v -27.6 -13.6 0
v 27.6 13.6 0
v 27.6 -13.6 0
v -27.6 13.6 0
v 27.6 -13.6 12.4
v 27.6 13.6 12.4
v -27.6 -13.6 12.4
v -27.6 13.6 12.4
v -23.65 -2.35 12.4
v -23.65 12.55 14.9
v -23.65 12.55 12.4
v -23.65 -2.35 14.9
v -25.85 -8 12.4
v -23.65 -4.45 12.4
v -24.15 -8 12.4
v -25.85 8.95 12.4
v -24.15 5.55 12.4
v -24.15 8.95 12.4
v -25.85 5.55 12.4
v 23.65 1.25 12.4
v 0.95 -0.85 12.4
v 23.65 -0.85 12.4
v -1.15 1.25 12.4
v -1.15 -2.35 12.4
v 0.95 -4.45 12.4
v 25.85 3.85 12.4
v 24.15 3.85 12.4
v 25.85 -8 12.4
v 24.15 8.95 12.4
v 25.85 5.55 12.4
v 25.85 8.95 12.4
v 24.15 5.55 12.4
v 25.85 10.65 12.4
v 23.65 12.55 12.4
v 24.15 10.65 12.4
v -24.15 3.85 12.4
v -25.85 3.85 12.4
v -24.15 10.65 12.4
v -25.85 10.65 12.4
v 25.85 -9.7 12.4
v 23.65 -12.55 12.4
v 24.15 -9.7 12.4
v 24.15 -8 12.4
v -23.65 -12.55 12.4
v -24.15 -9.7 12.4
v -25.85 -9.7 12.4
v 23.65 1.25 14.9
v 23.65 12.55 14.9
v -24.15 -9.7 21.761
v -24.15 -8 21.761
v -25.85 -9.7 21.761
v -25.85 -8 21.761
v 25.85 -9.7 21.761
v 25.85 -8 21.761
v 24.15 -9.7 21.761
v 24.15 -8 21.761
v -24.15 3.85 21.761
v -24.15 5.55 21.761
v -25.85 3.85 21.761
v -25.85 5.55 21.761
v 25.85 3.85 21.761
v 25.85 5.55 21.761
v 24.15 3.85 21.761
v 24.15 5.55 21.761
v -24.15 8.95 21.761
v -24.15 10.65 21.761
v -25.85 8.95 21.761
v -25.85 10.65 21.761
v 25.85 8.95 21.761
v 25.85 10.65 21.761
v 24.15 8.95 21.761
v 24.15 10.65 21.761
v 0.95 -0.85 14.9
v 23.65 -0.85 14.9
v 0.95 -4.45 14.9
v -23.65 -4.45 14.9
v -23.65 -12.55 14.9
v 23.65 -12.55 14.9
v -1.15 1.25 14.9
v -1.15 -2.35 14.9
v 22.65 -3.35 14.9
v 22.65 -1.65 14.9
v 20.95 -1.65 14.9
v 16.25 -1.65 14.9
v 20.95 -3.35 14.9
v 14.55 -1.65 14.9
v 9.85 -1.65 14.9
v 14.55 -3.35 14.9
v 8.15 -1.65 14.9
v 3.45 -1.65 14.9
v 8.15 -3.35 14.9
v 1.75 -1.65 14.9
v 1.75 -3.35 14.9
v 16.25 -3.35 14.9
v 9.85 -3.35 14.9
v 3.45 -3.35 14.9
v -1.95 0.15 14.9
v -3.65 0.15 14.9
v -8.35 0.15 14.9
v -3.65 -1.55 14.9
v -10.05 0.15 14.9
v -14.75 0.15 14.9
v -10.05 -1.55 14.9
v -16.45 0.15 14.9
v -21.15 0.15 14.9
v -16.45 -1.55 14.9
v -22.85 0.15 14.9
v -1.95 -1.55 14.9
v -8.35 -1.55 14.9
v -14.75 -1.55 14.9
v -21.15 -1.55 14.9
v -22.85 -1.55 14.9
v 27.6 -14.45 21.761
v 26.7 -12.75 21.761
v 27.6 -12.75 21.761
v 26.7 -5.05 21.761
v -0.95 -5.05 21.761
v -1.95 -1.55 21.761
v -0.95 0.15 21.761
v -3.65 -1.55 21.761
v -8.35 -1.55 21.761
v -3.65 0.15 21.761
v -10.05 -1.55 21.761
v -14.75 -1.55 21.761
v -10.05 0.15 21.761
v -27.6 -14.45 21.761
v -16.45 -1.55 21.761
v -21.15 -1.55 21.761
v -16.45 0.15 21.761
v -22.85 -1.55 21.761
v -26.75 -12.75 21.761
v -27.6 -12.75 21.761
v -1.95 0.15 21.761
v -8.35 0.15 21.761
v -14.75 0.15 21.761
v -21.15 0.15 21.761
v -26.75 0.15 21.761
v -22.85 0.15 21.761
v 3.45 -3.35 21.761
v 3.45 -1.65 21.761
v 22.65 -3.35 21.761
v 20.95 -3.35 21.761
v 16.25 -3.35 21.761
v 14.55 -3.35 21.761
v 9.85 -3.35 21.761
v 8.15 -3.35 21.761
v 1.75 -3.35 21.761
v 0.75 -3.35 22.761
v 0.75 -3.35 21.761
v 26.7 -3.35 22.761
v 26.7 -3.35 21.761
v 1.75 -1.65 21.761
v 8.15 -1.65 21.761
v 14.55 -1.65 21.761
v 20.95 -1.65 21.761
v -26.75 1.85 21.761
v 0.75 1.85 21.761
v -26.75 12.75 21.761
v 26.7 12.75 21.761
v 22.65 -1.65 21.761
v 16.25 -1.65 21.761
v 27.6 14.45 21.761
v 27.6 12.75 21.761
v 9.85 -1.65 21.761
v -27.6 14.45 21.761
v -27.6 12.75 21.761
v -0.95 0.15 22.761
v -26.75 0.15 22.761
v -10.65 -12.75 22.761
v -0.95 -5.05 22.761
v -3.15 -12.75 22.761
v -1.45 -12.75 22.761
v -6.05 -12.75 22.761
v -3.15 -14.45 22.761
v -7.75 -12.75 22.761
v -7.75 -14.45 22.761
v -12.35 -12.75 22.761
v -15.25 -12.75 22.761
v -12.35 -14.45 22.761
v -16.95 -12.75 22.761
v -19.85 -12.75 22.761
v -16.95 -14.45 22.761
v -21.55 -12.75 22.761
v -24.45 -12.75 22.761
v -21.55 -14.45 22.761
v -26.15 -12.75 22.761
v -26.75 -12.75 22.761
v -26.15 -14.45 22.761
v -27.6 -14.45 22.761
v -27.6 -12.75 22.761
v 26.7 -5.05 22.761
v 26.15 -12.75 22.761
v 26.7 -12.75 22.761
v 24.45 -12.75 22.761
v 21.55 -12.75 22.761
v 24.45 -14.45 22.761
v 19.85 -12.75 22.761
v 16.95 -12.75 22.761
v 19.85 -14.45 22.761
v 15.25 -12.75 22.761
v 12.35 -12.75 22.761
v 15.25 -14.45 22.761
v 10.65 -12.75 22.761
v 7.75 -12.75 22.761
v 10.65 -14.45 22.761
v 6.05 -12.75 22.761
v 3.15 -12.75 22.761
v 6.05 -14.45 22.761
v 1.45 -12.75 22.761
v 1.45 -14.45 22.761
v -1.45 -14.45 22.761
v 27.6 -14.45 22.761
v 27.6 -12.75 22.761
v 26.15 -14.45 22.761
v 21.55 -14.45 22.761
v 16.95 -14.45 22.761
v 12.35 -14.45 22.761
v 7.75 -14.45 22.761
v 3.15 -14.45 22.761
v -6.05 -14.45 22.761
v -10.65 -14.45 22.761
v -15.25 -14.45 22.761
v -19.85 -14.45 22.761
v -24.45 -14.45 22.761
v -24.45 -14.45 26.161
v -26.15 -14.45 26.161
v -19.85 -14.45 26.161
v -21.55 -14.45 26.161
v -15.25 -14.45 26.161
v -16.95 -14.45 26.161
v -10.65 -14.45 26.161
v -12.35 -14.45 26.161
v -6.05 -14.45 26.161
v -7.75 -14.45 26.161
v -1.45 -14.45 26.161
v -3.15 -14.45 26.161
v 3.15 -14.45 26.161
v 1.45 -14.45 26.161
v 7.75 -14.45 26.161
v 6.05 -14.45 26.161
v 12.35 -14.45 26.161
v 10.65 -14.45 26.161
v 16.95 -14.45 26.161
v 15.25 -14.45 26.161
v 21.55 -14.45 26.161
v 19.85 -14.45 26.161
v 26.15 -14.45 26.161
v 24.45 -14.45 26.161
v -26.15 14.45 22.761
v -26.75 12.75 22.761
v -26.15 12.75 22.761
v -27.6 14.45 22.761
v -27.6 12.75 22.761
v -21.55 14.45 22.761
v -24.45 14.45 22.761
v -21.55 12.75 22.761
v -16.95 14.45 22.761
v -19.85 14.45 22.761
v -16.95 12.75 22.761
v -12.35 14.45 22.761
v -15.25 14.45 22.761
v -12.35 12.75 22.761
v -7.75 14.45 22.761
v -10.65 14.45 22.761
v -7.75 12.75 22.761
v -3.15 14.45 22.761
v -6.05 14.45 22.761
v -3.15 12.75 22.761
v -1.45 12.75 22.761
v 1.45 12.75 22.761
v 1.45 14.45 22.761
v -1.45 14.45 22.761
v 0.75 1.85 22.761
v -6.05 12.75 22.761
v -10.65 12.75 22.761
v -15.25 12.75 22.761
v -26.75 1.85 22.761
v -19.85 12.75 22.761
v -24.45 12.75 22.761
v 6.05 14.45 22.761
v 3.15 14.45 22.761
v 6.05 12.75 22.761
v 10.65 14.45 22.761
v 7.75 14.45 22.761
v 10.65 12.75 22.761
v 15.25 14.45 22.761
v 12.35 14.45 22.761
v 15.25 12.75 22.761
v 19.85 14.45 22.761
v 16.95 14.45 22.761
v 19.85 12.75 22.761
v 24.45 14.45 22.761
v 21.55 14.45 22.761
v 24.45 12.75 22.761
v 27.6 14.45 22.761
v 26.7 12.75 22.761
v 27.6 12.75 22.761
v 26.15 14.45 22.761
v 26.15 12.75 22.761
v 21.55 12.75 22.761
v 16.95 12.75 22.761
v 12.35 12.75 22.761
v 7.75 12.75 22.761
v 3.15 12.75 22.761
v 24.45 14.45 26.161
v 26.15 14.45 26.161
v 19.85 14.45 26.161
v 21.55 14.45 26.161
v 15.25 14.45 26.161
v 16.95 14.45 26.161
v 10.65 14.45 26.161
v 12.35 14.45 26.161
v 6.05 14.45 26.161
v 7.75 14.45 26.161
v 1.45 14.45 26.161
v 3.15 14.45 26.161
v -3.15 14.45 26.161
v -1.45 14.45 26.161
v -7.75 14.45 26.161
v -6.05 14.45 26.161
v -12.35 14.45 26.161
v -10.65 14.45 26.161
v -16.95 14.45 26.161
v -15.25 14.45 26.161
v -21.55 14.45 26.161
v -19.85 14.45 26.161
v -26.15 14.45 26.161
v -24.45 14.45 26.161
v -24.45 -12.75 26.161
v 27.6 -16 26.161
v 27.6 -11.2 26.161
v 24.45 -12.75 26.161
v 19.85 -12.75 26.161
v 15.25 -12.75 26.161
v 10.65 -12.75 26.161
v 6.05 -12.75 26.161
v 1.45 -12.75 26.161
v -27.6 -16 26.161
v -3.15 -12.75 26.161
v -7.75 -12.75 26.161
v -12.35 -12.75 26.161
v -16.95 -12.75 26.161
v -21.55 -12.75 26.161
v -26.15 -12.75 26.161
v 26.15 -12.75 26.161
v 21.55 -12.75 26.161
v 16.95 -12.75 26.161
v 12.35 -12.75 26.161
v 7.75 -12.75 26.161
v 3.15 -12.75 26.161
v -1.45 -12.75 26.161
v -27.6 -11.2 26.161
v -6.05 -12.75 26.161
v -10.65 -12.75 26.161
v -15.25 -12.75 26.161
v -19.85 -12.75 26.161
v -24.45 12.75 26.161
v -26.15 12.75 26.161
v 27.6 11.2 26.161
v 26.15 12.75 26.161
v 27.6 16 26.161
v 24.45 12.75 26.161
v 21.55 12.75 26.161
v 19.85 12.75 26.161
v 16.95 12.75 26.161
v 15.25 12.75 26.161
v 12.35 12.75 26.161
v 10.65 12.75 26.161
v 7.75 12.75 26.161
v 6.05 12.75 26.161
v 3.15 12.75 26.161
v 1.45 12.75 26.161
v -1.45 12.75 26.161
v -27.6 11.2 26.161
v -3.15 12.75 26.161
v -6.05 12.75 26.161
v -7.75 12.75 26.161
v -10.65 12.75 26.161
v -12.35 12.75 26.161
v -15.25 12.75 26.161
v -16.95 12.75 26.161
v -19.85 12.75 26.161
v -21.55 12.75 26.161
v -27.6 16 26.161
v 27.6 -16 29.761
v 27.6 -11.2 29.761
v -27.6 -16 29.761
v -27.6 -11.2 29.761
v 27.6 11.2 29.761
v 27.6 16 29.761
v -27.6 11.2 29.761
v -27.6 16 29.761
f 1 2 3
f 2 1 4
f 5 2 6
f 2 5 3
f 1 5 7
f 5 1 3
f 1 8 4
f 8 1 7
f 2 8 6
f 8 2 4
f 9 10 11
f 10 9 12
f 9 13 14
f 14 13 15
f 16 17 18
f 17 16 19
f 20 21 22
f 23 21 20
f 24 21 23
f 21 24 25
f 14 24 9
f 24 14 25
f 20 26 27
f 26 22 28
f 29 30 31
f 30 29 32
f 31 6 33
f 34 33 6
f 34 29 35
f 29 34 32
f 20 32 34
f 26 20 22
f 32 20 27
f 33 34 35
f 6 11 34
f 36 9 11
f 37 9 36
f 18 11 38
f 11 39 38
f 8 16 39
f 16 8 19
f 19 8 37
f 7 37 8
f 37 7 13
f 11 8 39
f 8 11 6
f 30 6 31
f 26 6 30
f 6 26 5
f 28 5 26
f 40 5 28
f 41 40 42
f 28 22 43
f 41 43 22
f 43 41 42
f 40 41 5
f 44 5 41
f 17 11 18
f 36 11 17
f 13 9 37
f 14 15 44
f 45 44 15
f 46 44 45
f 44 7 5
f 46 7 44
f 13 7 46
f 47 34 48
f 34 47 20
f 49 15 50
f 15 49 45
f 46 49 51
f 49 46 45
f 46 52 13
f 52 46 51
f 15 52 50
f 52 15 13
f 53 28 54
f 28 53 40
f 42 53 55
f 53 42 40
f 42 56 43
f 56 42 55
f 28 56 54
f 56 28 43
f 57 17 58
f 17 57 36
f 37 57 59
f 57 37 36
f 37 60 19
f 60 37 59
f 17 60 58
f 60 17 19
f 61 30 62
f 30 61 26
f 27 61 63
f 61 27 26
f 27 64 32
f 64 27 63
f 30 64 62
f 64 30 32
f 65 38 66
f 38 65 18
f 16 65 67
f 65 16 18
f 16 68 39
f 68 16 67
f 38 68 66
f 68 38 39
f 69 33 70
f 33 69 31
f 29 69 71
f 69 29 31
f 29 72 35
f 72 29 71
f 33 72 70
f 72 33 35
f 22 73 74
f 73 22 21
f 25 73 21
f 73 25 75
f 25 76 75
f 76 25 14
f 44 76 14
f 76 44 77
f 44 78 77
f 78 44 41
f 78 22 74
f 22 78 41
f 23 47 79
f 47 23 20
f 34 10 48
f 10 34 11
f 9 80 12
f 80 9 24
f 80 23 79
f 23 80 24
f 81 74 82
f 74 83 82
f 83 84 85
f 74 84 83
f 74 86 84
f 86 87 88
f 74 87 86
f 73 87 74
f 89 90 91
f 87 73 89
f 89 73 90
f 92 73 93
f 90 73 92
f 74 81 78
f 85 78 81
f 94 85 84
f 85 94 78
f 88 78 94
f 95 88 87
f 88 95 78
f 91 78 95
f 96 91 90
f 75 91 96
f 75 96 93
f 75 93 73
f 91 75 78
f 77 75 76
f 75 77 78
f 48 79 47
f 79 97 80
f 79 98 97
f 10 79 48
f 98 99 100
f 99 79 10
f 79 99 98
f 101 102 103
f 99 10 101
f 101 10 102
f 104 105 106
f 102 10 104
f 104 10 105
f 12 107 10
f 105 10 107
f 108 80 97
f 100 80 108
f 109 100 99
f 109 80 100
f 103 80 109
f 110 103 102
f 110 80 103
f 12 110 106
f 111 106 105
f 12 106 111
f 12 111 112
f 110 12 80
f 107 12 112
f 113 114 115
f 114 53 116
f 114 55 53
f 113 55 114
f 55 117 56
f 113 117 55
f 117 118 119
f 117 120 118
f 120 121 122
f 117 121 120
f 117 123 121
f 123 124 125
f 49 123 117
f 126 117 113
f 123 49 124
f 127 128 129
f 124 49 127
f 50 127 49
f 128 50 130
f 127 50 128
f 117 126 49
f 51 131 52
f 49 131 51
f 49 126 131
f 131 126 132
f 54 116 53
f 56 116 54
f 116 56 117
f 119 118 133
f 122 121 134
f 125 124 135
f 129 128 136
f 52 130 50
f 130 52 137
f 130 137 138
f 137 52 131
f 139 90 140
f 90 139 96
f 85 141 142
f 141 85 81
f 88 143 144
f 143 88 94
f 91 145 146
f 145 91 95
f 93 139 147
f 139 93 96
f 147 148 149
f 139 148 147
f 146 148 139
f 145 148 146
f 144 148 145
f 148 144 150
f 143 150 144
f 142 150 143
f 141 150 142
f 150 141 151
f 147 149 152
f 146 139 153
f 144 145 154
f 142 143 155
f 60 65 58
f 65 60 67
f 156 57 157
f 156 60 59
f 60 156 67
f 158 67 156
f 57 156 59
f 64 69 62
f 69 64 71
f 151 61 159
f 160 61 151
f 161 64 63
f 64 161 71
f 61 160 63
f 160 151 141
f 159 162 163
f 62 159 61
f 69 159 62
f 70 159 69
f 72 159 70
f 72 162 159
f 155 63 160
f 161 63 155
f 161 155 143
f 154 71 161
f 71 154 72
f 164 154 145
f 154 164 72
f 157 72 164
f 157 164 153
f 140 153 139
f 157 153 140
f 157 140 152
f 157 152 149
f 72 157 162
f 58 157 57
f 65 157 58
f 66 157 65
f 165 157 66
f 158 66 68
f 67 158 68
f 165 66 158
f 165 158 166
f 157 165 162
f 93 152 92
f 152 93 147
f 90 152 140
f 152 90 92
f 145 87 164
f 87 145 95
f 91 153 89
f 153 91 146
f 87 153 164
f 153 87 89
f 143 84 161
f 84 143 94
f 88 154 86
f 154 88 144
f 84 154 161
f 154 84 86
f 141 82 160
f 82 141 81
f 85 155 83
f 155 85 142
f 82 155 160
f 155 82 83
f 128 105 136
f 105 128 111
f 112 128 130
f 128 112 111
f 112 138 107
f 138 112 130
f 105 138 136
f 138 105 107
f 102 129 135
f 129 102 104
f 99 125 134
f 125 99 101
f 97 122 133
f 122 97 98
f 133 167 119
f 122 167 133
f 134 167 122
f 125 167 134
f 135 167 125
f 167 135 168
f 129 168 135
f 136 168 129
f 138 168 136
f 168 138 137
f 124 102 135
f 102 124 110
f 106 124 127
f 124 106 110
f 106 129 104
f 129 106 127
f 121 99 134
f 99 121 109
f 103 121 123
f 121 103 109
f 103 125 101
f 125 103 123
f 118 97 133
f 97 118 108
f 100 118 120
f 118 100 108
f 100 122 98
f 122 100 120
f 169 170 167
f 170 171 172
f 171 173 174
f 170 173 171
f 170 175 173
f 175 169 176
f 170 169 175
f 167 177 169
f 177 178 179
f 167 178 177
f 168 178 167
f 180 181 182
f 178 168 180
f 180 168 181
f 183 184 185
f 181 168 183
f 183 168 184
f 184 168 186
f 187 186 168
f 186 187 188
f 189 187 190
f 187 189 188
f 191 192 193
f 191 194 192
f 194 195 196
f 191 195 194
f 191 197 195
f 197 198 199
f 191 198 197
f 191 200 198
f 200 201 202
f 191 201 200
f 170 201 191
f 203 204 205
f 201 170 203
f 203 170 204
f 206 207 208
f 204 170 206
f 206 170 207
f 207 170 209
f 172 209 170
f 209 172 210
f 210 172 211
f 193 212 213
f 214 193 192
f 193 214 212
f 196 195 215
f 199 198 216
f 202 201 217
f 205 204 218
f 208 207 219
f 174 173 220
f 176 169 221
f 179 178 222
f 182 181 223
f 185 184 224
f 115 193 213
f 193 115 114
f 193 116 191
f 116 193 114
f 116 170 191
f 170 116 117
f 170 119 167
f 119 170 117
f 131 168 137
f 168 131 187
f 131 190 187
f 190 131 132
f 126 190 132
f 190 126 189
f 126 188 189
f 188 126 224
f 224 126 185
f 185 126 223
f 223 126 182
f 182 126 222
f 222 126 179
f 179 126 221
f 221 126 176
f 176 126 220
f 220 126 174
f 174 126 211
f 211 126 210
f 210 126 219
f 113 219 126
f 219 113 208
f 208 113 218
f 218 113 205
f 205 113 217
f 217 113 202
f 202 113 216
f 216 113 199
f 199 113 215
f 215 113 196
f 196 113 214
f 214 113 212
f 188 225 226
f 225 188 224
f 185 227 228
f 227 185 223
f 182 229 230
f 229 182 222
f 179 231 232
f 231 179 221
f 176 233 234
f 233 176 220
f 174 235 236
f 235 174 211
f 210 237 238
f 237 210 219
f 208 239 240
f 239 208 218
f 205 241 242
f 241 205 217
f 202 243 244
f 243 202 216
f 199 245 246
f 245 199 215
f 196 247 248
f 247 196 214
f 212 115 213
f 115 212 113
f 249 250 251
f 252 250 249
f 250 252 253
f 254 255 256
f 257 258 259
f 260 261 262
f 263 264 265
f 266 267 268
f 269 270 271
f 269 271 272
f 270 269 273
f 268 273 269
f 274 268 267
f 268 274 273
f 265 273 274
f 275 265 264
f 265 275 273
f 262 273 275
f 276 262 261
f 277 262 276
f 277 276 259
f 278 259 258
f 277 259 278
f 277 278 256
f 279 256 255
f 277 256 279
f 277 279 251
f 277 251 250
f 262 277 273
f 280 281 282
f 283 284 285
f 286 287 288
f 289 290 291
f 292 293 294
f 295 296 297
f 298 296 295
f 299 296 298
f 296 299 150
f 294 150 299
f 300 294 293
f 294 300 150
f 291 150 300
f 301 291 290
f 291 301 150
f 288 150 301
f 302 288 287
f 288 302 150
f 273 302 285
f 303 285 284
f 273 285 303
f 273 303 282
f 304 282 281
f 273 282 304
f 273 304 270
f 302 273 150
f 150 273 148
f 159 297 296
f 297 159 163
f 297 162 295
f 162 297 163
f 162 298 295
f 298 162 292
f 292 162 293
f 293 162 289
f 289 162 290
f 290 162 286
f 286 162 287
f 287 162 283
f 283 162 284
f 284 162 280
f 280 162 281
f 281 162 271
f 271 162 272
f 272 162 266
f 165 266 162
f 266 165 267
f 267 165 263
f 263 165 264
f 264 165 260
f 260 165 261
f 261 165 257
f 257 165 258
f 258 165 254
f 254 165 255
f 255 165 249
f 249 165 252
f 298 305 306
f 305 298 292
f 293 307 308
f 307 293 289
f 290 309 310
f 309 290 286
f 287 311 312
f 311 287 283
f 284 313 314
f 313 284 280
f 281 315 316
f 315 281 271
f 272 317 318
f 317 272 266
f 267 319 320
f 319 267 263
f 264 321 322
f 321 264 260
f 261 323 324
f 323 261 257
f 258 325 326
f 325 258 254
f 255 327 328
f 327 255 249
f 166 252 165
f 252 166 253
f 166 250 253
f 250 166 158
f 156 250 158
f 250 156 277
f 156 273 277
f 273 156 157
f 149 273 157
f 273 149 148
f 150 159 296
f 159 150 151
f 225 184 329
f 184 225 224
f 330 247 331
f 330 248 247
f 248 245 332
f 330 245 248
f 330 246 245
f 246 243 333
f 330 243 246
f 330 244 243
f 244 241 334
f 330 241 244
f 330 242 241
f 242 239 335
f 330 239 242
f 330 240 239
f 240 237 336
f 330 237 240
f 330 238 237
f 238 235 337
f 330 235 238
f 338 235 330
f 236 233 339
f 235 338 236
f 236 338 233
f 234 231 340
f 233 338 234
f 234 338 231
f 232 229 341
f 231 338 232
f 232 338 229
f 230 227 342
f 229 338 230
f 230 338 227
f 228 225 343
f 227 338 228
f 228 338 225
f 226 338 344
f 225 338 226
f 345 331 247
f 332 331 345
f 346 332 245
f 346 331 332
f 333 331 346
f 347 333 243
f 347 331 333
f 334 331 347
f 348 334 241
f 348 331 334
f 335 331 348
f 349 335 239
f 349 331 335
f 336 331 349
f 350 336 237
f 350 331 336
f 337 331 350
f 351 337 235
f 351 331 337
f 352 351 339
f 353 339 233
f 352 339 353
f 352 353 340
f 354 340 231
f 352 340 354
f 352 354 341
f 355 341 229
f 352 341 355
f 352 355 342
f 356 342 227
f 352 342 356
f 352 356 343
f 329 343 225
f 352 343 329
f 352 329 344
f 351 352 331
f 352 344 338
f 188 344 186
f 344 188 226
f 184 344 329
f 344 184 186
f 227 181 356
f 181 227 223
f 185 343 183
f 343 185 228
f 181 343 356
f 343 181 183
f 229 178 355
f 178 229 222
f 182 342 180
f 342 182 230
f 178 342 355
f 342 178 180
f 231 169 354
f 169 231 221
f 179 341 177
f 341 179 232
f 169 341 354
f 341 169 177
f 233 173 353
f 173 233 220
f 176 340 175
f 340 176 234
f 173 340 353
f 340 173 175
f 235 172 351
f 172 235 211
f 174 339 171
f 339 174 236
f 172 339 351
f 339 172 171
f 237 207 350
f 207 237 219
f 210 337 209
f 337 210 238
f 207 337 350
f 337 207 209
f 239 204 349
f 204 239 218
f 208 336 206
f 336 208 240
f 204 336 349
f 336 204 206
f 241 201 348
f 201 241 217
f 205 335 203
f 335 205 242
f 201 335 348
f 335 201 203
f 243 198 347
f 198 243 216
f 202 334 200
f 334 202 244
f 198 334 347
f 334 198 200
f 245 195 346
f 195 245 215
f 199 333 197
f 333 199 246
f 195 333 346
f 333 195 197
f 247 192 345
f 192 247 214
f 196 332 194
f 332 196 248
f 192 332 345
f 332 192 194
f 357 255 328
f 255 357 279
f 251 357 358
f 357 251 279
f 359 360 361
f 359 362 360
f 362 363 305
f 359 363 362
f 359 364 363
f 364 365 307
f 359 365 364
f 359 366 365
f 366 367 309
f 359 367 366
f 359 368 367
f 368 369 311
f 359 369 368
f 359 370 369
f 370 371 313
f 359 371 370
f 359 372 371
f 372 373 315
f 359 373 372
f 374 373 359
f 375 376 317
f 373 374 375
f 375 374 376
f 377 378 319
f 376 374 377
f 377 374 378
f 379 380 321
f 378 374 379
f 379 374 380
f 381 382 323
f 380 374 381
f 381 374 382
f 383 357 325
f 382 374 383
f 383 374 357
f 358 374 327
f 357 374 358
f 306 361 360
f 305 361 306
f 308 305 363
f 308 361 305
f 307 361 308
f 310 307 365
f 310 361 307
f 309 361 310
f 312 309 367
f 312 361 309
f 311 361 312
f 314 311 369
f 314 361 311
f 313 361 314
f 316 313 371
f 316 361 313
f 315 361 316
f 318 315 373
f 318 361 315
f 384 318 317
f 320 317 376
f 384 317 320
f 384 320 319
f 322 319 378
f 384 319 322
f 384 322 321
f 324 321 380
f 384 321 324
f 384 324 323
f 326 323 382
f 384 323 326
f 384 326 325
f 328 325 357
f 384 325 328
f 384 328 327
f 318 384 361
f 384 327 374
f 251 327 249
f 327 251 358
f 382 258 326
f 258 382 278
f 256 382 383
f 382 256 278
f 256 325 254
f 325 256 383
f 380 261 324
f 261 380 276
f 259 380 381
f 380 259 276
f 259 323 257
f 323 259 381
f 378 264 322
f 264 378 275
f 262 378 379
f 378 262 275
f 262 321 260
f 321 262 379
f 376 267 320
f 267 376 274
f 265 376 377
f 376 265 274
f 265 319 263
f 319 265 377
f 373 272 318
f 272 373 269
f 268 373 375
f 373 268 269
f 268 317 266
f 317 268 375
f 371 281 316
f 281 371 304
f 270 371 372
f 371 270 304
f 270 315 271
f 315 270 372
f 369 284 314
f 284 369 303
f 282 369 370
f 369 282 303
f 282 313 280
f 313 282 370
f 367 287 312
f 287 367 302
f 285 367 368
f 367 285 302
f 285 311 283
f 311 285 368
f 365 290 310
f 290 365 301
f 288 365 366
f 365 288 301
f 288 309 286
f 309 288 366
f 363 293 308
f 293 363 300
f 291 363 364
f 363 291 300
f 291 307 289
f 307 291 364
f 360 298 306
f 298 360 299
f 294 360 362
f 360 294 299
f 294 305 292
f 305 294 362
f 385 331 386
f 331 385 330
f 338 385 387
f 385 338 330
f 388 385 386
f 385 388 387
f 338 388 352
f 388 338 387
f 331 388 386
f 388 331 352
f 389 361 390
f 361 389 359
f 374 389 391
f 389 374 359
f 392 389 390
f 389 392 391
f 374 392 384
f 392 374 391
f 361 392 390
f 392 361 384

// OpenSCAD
// Generated by SolidPython 0.4.2 on 2020-09-29 23:20:25
//!OpenSCAD

scale(v = 0.0100000000) {
	translate(v = [-2760, -1360, 0]) {
		union() {
			color(c = [0.4000000000, 0.4000000000, 0.4000000000]) {
				translate(v = [0, 0, 0]) {
					linear_extrude(height = 1000.0000000000) {
						polygon(paths = [[0, 1, 2, 3]], points = [[0, 0], [0, 2720], [5520, 2720], [5520, 0]]);
					}
				}
			}
			color(c = [0.2000000000, 0.6000000000, 0.2000000000]) {
				translate(v = [0, 0, 1000.0000000000]) {
					linear_extrude(height = 120.0000000000) {
						polygon(paths = [[0, 1, 2, 3]], points = [[0, 1305], [0, 2720], [5520, 2720], [5520, 1305]]);
					}
				}
			}
			color(c = [0.4000000000, 0.4000000000, 0.4000000000]) {
				translate(v = [0, 0, 1000.0000000000]) {
					linear_extrude(height = 120.0000000000) {
						polygon(paths = [[0, 1, 2, 3]], points = [[0, 0], [0, 1305], [5520, 1305], [5520, 0]]);
					}
				}
			}
			color(c = [0.9000000000, 0.6000000000, 0.6000000000]) {
				translate(v = [0, 0, 1120.0000000000]) {
					linear_extrude(height = 120.0000000000) {
						polygon(paths = [[0, 1, 2, 3]], points = [[135, 1615], [135, 2485], [395, 2485], [395, 1615]]);
					}
				}
			}
			color(c = [0.9000000000, 0.6000000000, 0.6000000000]) {
				translate(v = [0, 0, 1120.0000000000]) {
					linear_extrude(height = 120.0000000000) {
						polygon(paths = [[0, 1, 2, 3]], points = [[5125, 1615], [5125, 2485], [5385, 2485], [5385, 1615]]);
					}
				}
			}
			color(c = [0.9000000000, 0.6000000000, 0.9000000000]) {
				translate(v = [0, 0, 1120.0000000000]) {
					linear_extrude(height = 120.0000000000) {
						polygon(paths = [[0, 1, 2, 3]], points = [[135, 235], [135, 785], [395, 785], [395, 235]]);
					}
				}
			}
			color(c = [0.9000000000, 0.6000000000, 0.9000000000]) {
				translate(v = [0, 0, 1120.0000000000]) {
					linear_extrude(height = 120.0000000000) {
						polygon(paths = [[0, 1, 2, 3]], points = [[5125, 235], [5125, 785], [5385, 785], [5385, 235]]);
					}
				}
			}
			color(c = [0.2000000000, 0.6000000000, 0.2000000000]) {
				translate(v = [0, 0, 1120.0000000000]) {
					linear_extrude(height = 120.0000000000) {
						difference() {
							polygon(paths = [[0, 1, 2, 3]], points = [[0, 1305], [0, 2720], [5520, 2720], [5520, 1305]]);
							polygon(paths = [[0, 1, 2, 3]], points = [[135, 1615], [395, 1615], [395, 2485], [135, 2485]]);
							polygon(paths = [[0, 1, 2, 3]], points = [[5125, 1615], [5385, 1615], [5385, 2485], [5125, 2485]]);
						}
					}
				}
			}
			color(c = [0.4000000000, 0.4000000000, 0.4000000000]) {
				translate(v = [0, 0, 1120.0000000000]) {
					linear_extrude(height = 120.0000000000) {
						difference() {
							polygon(paths = [[0, 1, 2, 3]], points = [[0, 0], [0, 1305], [5520, 1305], [5520, 0]]);
							polygon(paths = [[0, 1, 2, 3]], points = [[135, 235], [395, 235], [395, 785], [135, 785]]);
							polygon(paths = [[0, 1, 2, 3]], points = [[5125, 235], [5385, 235], [5385, 785], [5125, 785]]);
						}
					}
				}
			}
			color(c = [0.1000000000, 0.1000000000, 0.1000000000]) {
				translate(v = [0, 0, 1240.0000000000]) {
					linear_extrude(height = 70.0000000000) {
						polygon(paths = [[0, 1, 2, 3]], points = [[175, 390], [175, 560], [345, 560], [345, 390]]);
					}
				}
			}
			color(c = [0.1000000000, 0.1000000000, 0.1000000000]) {
				translate(v = [0, 0, 1240.0000000000]) {
					linear_extrude(height = 70.0000000000) {
						polygon(paths = [[0, 1, 2, 3]], points = [[5175, 390], [5175, 560], [5345, 560], [5345, 390]]);
					}
				}
			}
			color(c = [0.1000000000, 0.1000000000, 0.1000000000]) {
				translate(v = [0, 0, 1240.0000000000]) {
					linear_extrude(height = 70.0000000000) {
						polygon(paths = [[0, 1, 2, 3]], points = [[175, 1745], [175, 1915], [345, 1915], [345, 1745]]);
					}
				}
			}
			color(c = [0.1000000000, 0.1000000000, 0.1000000000]) {
				translate(v = [0, 0, 1240.0000000000]) {
					linear_extrude(height = 70.0000000000) {
						polygon(paths = [[0, 1, 2, 3]], points = [[5175, 1745], [5175, 1915], [5345, 1915], [5345, 1745]]);
					}
				}
			}
			color(c = [0.1000000000, 0.1000000000, 0.1000000000]) {
				translate(v = [0, 0, 1240.0000000000]) {
					linear_extrude(height = 70.0000000000) {
						polygon(paths = [[0, 1, 2, 3]], points = [[175, 2255], [175, 2425], [345, 2425], [345, 2255]]);
					}
				}
			}
			color(c = [0.1000000000, 0.1000000000, 0.1000000000]) {
				translate(v = [0, 0, 1240.0000000000]) {
					linear_extrude(height = 70.0000000000) {
						polygon(paths = [[0, 1, 2, 3]], points = [[5175, 2255], [5175, 2425], [5345, 2425], [5345, 2255]]);
					}
				}
			}
			color(c = [1.0000000000, 1.0000000000, 1.0000000000]) {
				translate(v = [0, 0, 1240.0000000000]) {
					linear_extrude(height = 70.0000000000) {
						polygon(paths = [[0, 1, 2, 3, 4, 5]], points = [[395, 105], [395, 915], [2855, 915], [2855, 1275], [5125, 1275], [5125, 105]]);
					}
				}
			}
			color(c = [1.0000000000, 1.0000000000, 1.0000000000]) {
				translate(v = [0, 0, 1240.0000000000]) {
					linear_extrude(height = 70.0000000000) {
						polygon(paths = [[0, 1, 2, 3, 4, 5]], points = [[395, 1125], [395, 2615], [5125, 2615], [5125, 1485], [2645, 1485], [2645, 1125]]);
					}
				}
			}
			color(c = [0.1000000000, 0.1000000000, 0.1000000000]) {
				translate(v = [0, 0, 1310.0000000000]) {
					linear_extrude(height = 180.0000000000) {
						polygon(paths = [[0, 1, 2, 3]], points = [[175, 390], [175, 560], [345, 560], [345, 390]]);
					}
				}
			}
			color(c = [0.1000000000, 0.1000000000, 0.1000000000]) {
				translate(v = [0, 0, 1310.0000000000]) {
					linear_extrude(height = 180.0000000000) {
						polygon(paths = [[0, 1, 2, 3]], points = [[5175, 390], [5175, 560], [5345, 560], [5345, 390]]);
					}
				}
			}
			color(c = [0.1000000000, 0.1000000000, 0.1000000000]) {
				translate(v = [0, 0, 1310.0000000000]) {
					linear_extrude(height = 180.0000000000) {
						polygon(paths = [[0, 1, 2, 3]], points = [[175, 1745], [175, 1915], [345, 1915], [345, 1745]]);
					}
				}
			}
			color(c = [0.1000000000, 0.1000000000, 0.1000000000]) {
				translate(v = [0, 0, 1310.0000000000]) {
					linear_extrude(height = 180.0000000000) {
						polygon(paths = [[0, 1, 2, 3]], points = [[5175, 1745], [5175, 1915], [5345, 1915], [5345, 1745]]);
					}
				}
			}
			color(c = [0.1000000000, 0.1000000000, 0.1000000000]) {
				translate(v = [0, 0, 1310.0000000000]) {
					linear_extrude(height = 180.0000000000) {
						polygon(paths = [[0, 1, 2, 3]], points = [[175, 2255], [175, 2425], [345, 2425], [345, 2255]]);
					}
				}
			}
			color(c = [0.1000000000, 0.1000000000, 0.1000000000]) {
				translate(v = [0, 0, 1310.0000000000]) {
					linear_extrude(height = 180.0000000000) {
						polygon(paths = [[0, 1, 2, 3]], points = [[5175, 2255], [5175, 2425], [5345, 2425], [5345, 2255]]);
					}
				}
			}
			color(c = [0.7000000000, 0, 0]) {
				translate(v = [0, 0, 1310.0000000000]) {
					linear_extrude(height = 180.0000000000) {
						polygon(paths = [[0, 1, 2, 3, 4, 5]], points = [[395, 105], [395, 915], [2855, 915], [2855, 1275], [5125, 1275], [5125, 105]]);
					}
				}
			}
			color(c = [0.7000000000, 0, 0]) {
				translate(v = [0, 0, 1310.0000000000]) {
					linear_extrude(height = 180.0000000000) {
						polygon(paths = [[0, 1, 2, 3, 4, 5]], points = [[395, 1125], [395, 2615], [5125, 2615], [5125, 1485], [2645, 1485], [2645, 1125]]);
					}
				}
			}
			color(c = [0.1000000000, 0.1000000000, 0.1000000000]) {
				translate(v = [0, 0, 1490.0000000000]) {
					linear_extrude(height = 686.1000000000) {
						polygon(paths = [[0, 1, 2, 3]], points = [[175, 390], [175, 560], [345, 560], [345, 390]]);
					}
				}
			}
			color(c = [0.1000000000, 0.1000000000, 0.1000000000]) {
				translate(v = [0, 0, 1490.0000000000]) {
					linear_extrude(height = 686.1000000000) {
						polygon(paths = [[0, 1, 2, 3]], points = [[5175, 390], [5175, 560], [5345, 560], [5345, 390]]);
					}
				}
			}
			color(c = [0.1000000000, 0.1000000000, 0.1000000000]) {
				translate(v = [0, 0, 1490.0000000000]) {
					linear_extrude(height = 686.1000000000) {
						polygon(paths = [[0, 1, 2, 3]], points = [[2935, 1025], [2935, 1195], [3105, 1195], [3105, 1025]]);
					}
				}
			}
			color(c = [0.1000000000, 0.1000000000, 0.1000000000]) {
				translate(v = [0, 0, 1490.0000000000]) {
					linear_extrude(height = 686.1000000000) {
						polygon(paths = [[0, 1, 2, 3]], points = [[3575, 1025], [3575, 1195], [3745, 1195], [3745, 1025]]);
					}
				}
			}
			color(c = [0.1000000000, 0.1000000000, 0.1000000000]) {
				translate(v = [0, 0, 1490.0000000000]) {
					linear_extrude(height = 686.1000000000) {
						polygon(paths = [[0, 1, 2, 3]], points = [[4215, 1025], [4215, 1195], [4385, 1195], [4385, 1025]]);
					}
				}
			}
			color(c = [0.1000000000, 0.1000000000, 0.1000000000]) {
				translate(v = [0, 0, 1490.0000000000]) {
					linear_extrude(height = 686.1000000000) {
						polygon(paths = [[0, 1, 2, 3]], points = [[4855, 1025], [4855, 1195], [5025, 1195], [5025, 1025]]);
					}
				}
			}
			color(c = [0.1000000000, 0.1000000000, 0.1000000000]) {
				translate(v = [0, 0, 1490.0000000000]) {
					linear_extrude(height = 686.1000000000) {
						polygon(paths = [[0, 1, 2, 3]], points = [[475, 1205], [475, 1375], [645, 1375], [645, 1205]]);
					}
				}
			}
			color(c = [0.1000000000, 0.1000000000, 0.1000000000]) {
				translate(v = [0, 0, 1490.0000000000]) {
					linear_extrude(height = 686.1000000000) {
						polygon(paths = [[0, 1, 2, 3]], points = [[1115, 1205], [1115, 1375], [1285, 1375], [1285, 1205]]);
					}
				}
			}
			color(c = [0.1000000000, 0.1000000000, 0.1000000000]) {
				translate(v = [0, 0, 1490.0000000000]) {
					linear_extrude(height = 686.1000000000) {
						polygon(paths = [[0, 1, 2, 3]], points = [[1755, 1205], [1755, 1375], [1925, 1375], [1925, 1205]]);
					}
				}
			}
			color(c = [0.1000000000, 0.1000000000, 0.1000000000]) {
				translate(v = [0, 0, 1490.0000000000]) {
					linear_extrude(height = 686.1000000000) {
						polygon(paths = [[0, 1, 2, 3]], points = [[2395, 1205], [2395, 1375], [2565, 1375], [2565, 1205]]);
					}
				}
			}
			color(c = [0.1000000000, 0.1000000000, 0.1000000000]) {
				translate(v = [0, 0, 1490.0000000000]) {
					linear_extrude(height = 686.1000000000) {
						polygon(paths = [[0, 1, 2, 3]], points = [[175, 1745], [175, 1915], [345, 1915], [345, 1745]]);
					}
				}
			}
			color(c = [0.1000000000, 0.1000000000, 0.1000000000]) {
				translate(v = [0, 0, 1490.0000000000]) {
					linear_extrude(height = 686.1000000000) {
						polygon(paths = [[0, 1, 2, 3]], points = [[5175, 1745], [5175, 1915], [5345, 1915], [5345, 1745]]);
					}
				}
			}
			color(c = [0.1000000000, 0.1000000000, 0.1000000000]) {
				translate(v = [0, 0, 1490.0000000000]) {
					linear_extrude(height = 686.1000000000) {
						polygon(paths = [[0, 1, 2, 3]], points = [[175, 2255], [175, 2425], [345, 2425], [345, 2255]]);
					}
				}
			}
			color(c = [0.1000000000, 0.1000000000, 0.1000000000]) {
				translate(v = [0, 0, 1490.0000000000]) {
					linear_extrude(height = 686.1000000000) {
						polygon(paths = [[0, 1, 2, 3]], points = [[5175, 2255], [5175, 2425], [5345, 2425], [5345, 2255]]);
					}
				}
			}
			color(c = [0.9000000000, 0.6000000000, 0.6000000000]) {
				translate(v = [0, 0, 2176.1000000000]) {
					linear_extrude(height = 100.0000000000) {
						polygon(paths = [[0, 1, 2, 3, 4, 5, 6, 7, 8, 9]], points = [[0, -85], [0, 85], [85, 85], [85, 1375], [2665, 1375], [2665, 855], [5430, 855], [5430, 85], [5520, 85], [5520, -85]]);
					}
				}
			}
			color(c = [0.9000000000, 0.6000000000, 0.6000000000]) {
				translate(v = [0, 0, 2176.1000000000]) {
					linear_extrude(height = 100.0000000000) {
						polygon(paths = [[0, 1, 2, 3, 4, 5, 6, 7, 8, 9]], points = [[2835, 1025], [2835, 1545], [85, 1545], [85, 2635], [0, 2635], [0, 2805], [5520, 2805], [5520, 2635], [5430, 2635], [5430, 1025]]);
					}
				}
			}
			color(c = [0.5000000000, 0.5000000000, 0.5000000000]) {
				translate(v = [0, 0, 2276.1000000000]) {
					linear_extrude(height = 340.0000000000) {
						polygon(paths = [[0, 1, 2, 3]], points = [[145, -85], [145, 85], [315, 85], [315, -85]]);
					}
				}
			}
			color(c = [0.5000000000, 0.5000000000, 0.5000000000]) {
				translate(v = [0, 0, 2276.1000000000]) {
					linear_extrude(height = 340.0000000000) {
						polygon(paths = [[0, 1, 2, 3]], points = [[605, -85], [605, 85], [775, 85], [775, -85]]);
					}
				}
			}
			color(c = [0.5000000000, 0.5000000000, 0.5000000000]) {
				translate(v = [0, 0, 2276.1000000000]) {
					linear_extrude(height = 340.0000000000) {
						polygon(paths = [[0, 1, 2, 3]], points = [[1065, -85], [1065, 85], [1235, 85], [1235, -85]]);
					}
				}
			}
			color(c = [0.5000000000, 0.5000000000, 0.5000000000]) {
				translate(v = [0, 0, 2276.1000000000]) {
					linear_extrude(height = 340.0000000000) {
						polygon(paths = [[0, 1, 2, 3]], points = [[1525, -85], [1525, 85], [1695, 85], [1695, -85]]);
					}
				}
			}
			color(c = [0.5000000000, 0.5000000000, 0.5000000000]) {
				translate(v = [0, 0, 2276.1000000000]) {
					linear_extrude(height = 340.0000000000) {
						polygon(paths = [[0, 1, 2, 3]], points = [[1985, -85], [1985, 85], [2155, 85], [2155, -85]]);
					}
				}
			}
			color(c = [0.5000000000, 0.5000000000, 0.5000000000]) {
				translate(v = [0, 0, 2276.1000000000]) {
					linear_extrude(height = 340.0000000000) {
						polygon(paths = [[0, 1, 2, 3]], points = [[2445, -85], [2445, 85], [2615, 85], [2615, -85]]);
					}
				}
			}
			color(c = [0.5000000000, 0.5000000000, 0.5000000000]) {
				translate(v = [0, 0, 2276.1000000000]) {
					linear_extrude(height = 340.0000000000) {
						polygon(paths = [[0, 1, 2, 3]], points = [[2905, -85], [2905, 85], [3075, 85], [3075, -85]]);
					}
				}
			}
			color(c = [0.5000000000, 0.5000000000, 0.5000000000]) {
				translate(v = [0, 0, 2276.1000000000]) {
					linear_extrude(height = 340.0000000000) {
						polygon(paths = [[0, 1, 2, 3]], points = [[3365, -85], [3365, 85], [3535, 85], [3535, -85]]);
					}
				}
			}
			color(c = [0.5000000000, 0.5000000000, 0.5000000000]) {
				translate(v = [0, 0, 2276.1000000000]) {
					linear_extrude(height = 340.0000000000) {
						polygon(paths = [[0, 1, 2, 3]], points = [[3825, -85], [3825, 85], [3995, 85], [3995, -85]]);
					}
				}
			}
			color(c = [0.5000000000, 0.5000000000, 0.5000000000]) {
				translate(v = [0, 0, 2276.1000000000]) {
					linear_extrude(height = 340.0000000000) {
						polygon(paths = [[0, 1, 2, 3]], points = [[4285, -85], [4285, 85], [4455, 85], [4455, -85]]);
					}
				}
			}
			color(c = [0.5000000000, 0.5000000000, 0.5000000000]) {
				translate(v = [0, 0, 2276.1000000000]) {
					linear_extrude(height = 340.0000000000) {
						polygon(paths = [[0, 1, 2, 3]], points = [[4745, -85], [4745, 85], [4915, 85], [4915, -85]]);
					}
				}
			}
			color(c = [0.5000000000, 0.5000000000, 0.5000000000]) {
				translate(v = [0, 0, 2276.1000000000]) {
					linear_extrude(height = 340.0000000000) {
						polygon(paths = [[0, 1, 2, 3]], points = [[5205, -85], [5205, 85], [5375, 85], [5375, -85]]);
					}
				}
			}
			color(c = [0.5000000000, 0.5000000000, 0.5000000000]) {
				translate(v = [0, 0, 2276.1000000000]) {
					linear_extrude(height = 340.0000000000) {
						polygon(paths = [[0, 1, 2, 3]], points = [[145, 2635], [145, 2805], [315, 2805], [315, 2635]]);
					}
				}
			}
			color(c = [0.5000000000, 0.5000000000, 0.5000000000]) {
				translate(v = [0, 0, 2276.1000000000]) {
					linear_extrude(height = 340.0000000000) {
						polygon(paths = [[0, 1, 2, 3]], points = [[605, 2635], [605, 2805], [775, 2805], [775, 2635]]);
					}
				}
			}
			color(c = [0.5000000000, 0.5000000000, 0.5000000000]) {
				translate(v = [0, 0, 2276.1000000000]) {
					linear_extrude(height = 340.0000000000) {
						polygon(paths = [[0, 1, 2, 3]], points = [[1065, 2635], [1065, 2805], [1235, 2805], [1235, 2635]]);
					}
				}
			}
			color(c = [0.5000000000, 0.5000000000, 0.5000000000]) {
				translate(v = [0, 0, 2276.1000000000]) {
					linear_extrude(height = 340.0000000000) {
						polygon(paths = [[0, 1, 2, 3]], points = [[1525, 2635], [1525, 2805], [1695, 2805], [1695, 2635]]);
					}
				}
			}
			color(c = [0.5000000000, 0.5000000000, 0.5000000000]) {
				translate(v = [0, 0, 2276.1000000000]) {
					linear_extrude(height = 340.0000000000) {
						polygon(paths = [[0, 1, 2, 3]], points = [[1985, 2635], [1985, 2805], [2155, 2805], [2155, 2635]]);
					}
				}
			}
			color(c = [0.5000000000, 0.5000000000, 0.5000000000]) {
				translate(v = [0, 0, 2276.1000000000]) {
					linear_extrude(height = 340.0000000000) {
						polygon(paths = [[0, 1, 2, 3]], points = [[2445, 2635], [2445, 2805], [2615, 2805], [2615, 2635]]);
					}
				}
			}
			color(c = [0.5000000000, 0.5000000000, 0.5000000000]) {
				translate(v = [0, 0, 2276.1000000000]) {
					linear_extrude(height = 340.0000000000) {
						polygon(paths = [[0, 1, 2, 3]], points = [[2905, 2635], [2905, 2805], [3075, 2805], [3075, 2635]]);
					}
				}
			}
			color(c = [0.5000000000, 0.5000000000, 0.5000000000]) {
				translate(v = [0, 0, 2276.1000000000]) {
					linear_extrude(height = 340.0000000000) {
						polygon(paths = [[0, 1, 2, 3]], points = [[3365, 2635], [3365, 2805], [3535, 2805], [3535, 2635]]);
					}
				}
			}
			color(c = [0.5000000000, 0.5000000000, 0.5000000000]) {
				translate(v = [0, 0, 2276.1000000000]) {
					linear_extrude(height = 340.0000000000) {
						polygon(paths = [[0, 1, 2, 3]], points = [[3825, 2635], [3825, 2805], [3995, 2805], [3995, 2635]]);
					}
				}
			}
			color(c = [0.5000000000, 0.5000000000, 0.5000000000]) {
				translate(v = [0, 0, 2276.1000000000]) {
					linear_extrude(height = 340.0000000000) {
						polygon(paths = [[0, 1, 2, 3]], points = [[4285, 2635], [4285, 2805], [4455, 2805], [4455, 2635]]);
					}
				}
			}
			color(c = [0.5000000000, 0.5000000000, 0.5000000000]) {
				translate(v = [0, 0, 2276.1000000000]) {
					linear_extrude(height = 340.0000000000) {
						polygon(paths = [[0, 1, 2, 3]], points = [[4745, 2635], [4745, 2805], [4915, 2805], [4915, 2635]]);
					}
				}
			}
			color(c = [0.5000000000, 0.5000000000, 0.5000000000]) {
				translate(v = [0, 0, 2276.1000000000]) {
					linear_extrude(height = 340.0000000000) {
						polygon(paths = [[0, 1, 2, 3]], points = [[5205, 2635], [5205, 2805], [5375, 2805], [5375, 2635]]);
					}
				}
			}
			color(c = [0.3000000000, 0.3000000000, 1]) {
				translate(v = [0, 0, 2616.1000000000]) {
					linear_extrude(height = 360.0000000000) {
						polygon(paths = [[0, 1, 2, 3]], points = [[0, -240], [0, 240], [5520, 240], [5520, -240]]);
					}
				}
			}
			color(c = [0.3000000000, 0.3000000000, 1]) {
				translate(v = [0, 0, 2616.1000000000]) {
					linear_extrude(height = 360.0000000000) {
						polygon(paths = [[0, 1, 2, 3]], points = [[0, 2480], [0, 2960], [5520, 2960], [5520, 2480]]);
					}
				}
			}
		}
	}
}
